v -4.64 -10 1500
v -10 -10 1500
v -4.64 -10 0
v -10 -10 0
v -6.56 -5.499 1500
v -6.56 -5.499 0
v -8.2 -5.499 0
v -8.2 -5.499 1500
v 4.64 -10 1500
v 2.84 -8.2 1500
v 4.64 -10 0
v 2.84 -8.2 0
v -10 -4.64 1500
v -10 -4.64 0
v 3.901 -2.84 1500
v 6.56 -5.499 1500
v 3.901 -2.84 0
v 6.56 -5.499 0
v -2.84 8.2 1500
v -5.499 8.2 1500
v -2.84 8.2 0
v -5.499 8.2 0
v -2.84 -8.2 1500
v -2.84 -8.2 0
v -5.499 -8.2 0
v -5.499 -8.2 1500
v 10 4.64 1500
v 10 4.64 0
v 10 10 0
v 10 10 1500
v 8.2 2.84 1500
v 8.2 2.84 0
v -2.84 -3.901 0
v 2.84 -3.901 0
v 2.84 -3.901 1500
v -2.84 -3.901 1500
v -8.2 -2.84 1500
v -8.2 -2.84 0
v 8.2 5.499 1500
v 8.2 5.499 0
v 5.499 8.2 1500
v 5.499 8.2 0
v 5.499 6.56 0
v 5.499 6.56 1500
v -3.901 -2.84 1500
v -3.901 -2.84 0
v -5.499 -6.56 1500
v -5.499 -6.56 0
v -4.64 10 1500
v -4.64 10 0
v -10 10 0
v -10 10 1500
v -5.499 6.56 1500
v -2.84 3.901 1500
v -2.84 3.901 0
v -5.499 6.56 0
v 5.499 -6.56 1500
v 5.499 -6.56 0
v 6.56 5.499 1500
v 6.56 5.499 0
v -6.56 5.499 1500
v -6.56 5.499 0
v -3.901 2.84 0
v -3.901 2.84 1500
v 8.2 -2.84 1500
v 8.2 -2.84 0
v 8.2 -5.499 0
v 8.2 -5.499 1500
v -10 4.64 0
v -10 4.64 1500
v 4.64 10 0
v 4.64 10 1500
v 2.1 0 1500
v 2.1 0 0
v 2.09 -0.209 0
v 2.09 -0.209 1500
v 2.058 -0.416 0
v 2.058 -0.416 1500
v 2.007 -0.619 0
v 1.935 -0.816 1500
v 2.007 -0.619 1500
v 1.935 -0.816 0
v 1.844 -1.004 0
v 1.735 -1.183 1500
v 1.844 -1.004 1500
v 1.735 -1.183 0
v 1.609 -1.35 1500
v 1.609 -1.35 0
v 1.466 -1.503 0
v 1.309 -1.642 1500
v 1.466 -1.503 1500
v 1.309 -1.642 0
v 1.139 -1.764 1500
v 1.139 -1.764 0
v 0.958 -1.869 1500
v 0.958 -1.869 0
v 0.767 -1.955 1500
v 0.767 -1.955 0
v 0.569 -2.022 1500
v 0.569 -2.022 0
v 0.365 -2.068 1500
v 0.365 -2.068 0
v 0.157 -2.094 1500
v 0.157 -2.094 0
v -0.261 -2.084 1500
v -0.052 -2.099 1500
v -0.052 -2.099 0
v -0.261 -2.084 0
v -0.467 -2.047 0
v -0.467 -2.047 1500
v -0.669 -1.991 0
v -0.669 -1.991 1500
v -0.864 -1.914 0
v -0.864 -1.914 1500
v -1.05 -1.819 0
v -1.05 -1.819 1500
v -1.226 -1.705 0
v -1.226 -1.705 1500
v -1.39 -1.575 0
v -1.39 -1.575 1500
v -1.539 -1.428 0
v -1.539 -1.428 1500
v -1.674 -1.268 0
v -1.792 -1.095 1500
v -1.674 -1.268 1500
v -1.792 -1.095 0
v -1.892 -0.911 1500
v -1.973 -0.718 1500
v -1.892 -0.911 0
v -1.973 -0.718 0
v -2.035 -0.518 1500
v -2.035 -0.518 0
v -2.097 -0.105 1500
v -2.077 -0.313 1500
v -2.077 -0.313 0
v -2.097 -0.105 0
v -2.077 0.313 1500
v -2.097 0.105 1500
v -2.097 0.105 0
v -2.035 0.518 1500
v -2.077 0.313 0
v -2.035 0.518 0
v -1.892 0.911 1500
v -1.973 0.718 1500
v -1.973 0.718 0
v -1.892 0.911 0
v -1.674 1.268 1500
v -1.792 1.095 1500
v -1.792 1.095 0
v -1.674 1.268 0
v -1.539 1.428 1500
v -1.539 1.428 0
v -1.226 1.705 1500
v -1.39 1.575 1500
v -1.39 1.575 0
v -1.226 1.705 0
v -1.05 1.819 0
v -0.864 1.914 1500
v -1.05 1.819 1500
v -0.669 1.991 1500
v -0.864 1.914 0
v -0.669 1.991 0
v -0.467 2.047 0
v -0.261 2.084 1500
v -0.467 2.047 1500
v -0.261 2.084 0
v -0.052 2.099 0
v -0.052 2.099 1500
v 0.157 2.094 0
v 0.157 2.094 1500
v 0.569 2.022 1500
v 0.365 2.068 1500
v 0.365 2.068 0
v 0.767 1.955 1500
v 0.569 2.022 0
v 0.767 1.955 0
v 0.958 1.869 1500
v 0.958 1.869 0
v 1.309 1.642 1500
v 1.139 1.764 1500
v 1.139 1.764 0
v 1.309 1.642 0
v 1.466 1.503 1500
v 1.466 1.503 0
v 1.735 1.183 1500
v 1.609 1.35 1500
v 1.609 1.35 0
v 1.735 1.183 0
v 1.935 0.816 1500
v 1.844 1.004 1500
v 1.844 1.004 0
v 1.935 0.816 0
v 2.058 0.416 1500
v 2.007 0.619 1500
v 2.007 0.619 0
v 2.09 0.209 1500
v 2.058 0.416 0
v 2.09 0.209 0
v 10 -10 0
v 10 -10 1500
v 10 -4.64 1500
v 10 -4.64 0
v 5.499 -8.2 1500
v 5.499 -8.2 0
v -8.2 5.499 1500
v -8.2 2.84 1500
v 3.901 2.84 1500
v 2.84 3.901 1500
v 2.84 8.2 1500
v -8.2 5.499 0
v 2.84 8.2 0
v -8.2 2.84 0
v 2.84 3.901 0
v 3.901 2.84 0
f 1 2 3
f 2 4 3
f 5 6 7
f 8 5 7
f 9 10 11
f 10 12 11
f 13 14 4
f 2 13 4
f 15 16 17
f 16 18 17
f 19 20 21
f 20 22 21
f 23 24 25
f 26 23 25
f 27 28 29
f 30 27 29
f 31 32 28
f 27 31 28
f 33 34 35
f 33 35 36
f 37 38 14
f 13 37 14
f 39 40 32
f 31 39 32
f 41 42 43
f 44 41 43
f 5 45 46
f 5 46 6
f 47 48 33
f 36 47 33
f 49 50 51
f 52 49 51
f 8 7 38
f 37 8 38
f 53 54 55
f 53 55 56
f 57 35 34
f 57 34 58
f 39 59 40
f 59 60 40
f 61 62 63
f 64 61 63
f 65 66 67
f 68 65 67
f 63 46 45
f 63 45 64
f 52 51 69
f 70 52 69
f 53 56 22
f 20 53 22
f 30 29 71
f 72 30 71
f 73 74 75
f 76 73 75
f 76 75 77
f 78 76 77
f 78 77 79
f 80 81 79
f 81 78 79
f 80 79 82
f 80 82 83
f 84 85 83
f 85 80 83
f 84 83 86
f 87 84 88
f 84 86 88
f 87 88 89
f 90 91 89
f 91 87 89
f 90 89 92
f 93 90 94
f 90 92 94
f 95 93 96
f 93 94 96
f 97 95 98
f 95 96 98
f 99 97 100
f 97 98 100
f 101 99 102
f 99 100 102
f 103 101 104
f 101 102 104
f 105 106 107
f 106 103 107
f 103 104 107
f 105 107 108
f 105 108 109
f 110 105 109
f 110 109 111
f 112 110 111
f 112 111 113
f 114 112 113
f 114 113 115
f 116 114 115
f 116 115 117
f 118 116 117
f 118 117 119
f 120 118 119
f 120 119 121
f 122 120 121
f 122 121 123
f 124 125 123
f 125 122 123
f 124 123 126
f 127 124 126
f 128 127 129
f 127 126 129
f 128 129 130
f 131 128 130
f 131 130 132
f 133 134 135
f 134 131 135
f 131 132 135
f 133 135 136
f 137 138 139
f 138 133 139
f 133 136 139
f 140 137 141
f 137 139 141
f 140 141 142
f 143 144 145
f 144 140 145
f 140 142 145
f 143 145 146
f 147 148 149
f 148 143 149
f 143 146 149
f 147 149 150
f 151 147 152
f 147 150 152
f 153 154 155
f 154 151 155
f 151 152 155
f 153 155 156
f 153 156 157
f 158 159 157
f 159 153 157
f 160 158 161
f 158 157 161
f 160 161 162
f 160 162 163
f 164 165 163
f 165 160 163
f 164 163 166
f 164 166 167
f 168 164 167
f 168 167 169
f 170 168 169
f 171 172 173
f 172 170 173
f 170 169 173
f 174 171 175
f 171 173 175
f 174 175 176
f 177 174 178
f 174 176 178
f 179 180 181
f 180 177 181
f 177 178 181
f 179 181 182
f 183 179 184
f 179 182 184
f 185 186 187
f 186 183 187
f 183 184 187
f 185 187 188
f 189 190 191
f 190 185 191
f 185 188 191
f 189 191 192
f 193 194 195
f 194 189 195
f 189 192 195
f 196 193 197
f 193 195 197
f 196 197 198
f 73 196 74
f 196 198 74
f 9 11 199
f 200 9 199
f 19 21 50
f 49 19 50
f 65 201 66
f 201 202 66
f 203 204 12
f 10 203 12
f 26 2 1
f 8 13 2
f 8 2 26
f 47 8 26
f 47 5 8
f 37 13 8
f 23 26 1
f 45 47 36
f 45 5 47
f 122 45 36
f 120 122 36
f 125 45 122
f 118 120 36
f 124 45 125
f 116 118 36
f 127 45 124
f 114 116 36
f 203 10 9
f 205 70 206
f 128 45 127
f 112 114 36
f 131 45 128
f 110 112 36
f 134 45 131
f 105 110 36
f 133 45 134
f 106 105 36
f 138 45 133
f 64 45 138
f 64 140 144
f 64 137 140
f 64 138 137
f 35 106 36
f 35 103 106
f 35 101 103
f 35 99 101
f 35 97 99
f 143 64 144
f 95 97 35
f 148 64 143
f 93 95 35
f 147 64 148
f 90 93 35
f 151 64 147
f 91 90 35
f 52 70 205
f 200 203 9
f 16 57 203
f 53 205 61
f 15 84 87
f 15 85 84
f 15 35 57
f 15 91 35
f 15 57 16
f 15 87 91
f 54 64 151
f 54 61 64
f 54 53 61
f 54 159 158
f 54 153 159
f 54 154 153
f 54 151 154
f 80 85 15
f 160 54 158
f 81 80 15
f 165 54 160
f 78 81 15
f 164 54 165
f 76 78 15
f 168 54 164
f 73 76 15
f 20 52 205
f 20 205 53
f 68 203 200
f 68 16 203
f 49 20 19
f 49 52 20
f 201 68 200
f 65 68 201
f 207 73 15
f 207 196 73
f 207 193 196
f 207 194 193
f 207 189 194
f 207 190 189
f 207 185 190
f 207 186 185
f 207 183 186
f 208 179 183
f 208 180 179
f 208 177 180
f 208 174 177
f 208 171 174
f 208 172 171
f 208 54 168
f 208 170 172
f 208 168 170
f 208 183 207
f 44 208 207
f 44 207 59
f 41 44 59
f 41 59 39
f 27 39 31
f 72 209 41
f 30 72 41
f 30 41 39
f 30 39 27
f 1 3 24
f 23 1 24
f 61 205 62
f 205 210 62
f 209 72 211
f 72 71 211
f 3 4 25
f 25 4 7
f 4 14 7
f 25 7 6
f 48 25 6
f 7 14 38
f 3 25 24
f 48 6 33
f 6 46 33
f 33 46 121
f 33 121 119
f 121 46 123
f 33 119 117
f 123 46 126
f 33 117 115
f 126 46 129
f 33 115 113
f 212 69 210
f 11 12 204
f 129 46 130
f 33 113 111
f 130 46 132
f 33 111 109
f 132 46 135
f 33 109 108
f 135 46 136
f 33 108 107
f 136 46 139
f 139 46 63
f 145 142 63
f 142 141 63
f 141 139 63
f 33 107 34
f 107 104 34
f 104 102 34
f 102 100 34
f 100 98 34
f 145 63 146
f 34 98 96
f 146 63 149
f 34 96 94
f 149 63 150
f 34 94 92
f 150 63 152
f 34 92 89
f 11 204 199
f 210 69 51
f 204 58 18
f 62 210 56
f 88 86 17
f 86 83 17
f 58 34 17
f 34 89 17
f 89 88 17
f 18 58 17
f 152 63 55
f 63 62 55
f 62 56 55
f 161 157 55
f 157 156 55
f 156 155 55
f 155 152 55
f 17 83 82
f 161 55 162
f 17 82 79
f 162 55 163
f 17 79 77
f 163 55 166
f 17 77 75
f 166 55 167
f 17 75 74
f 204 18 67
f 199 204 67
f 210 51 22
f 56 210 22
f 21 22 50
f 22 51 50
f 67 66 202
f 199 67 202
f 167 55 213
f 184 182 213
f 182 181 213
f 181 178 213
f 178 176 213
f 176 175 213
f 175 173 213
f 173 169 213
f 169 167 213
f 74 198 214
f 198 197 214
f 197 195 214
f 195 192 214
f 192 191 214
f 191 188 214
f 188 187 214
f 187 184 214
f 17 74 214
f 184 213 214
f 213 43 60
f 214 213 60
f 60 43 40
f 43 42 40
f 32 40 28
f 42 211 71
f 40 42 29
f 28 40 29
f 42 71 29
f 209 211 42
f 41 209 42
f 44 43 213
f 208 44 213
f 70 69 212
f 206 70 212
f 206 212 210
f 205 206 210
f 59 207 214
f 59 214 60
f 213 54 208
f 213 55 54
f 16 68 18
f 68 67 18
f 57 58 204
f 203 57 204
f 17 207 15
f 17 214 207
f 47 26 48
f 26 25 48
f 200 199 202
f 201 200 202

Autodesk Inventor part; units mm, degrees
ref_plane "YZ Plane" through (0, 0, 0) normal (1, 0, 0) x (0, 1, 0)
ref_plane "XZ Plane" through (0, 0, 0) normal (0, 1, 0) x (-1, 0, 0)
ref_plane "XY Plane" through (0, 0, 0) normal (0, 0, 1) x (1, 0, 0)
sketch "Sketch1" plane through (0, 0, 0) normal (0, 0, 1) x (1, 0, 0)
  line L0 (-3.9007, 3.9007) -> (3.9007, 3.9007)
  line L1 (3.9007, 3.9007) -> (3.9007, -3.9007)
  line L2 (3.9007, -3.9007) -> (-3.9007, -3.9007)
  line L3 (-3.9007, -3.9007) -> (-3.9007, 3.9007)
  line L4 (0, 3.9007) -> (0, -3.9007) construction
  line L5 (-3.9007, 0) -> (3.9007, 0) construction
  circle A0 centre (0, 0) radius 2.1
  line L6 (0, 0) -> (-16.1173, 16.1173) construction
  line L7 (0, 0) -> (22.7933, 0) construction
  line L8 (-2.84, 3.9007) -> (-5.4993, 6.56)
  line L9 (-5.4993, 6.56) -> (-5.4993, 8.2)
  line L10 (-5.4993, 8.2) -> (-2.84, 8.2)
  line L11 (-2.84, 8.2) -> (-4.64, 10)
  line L12 (-4.64, 10) -> (-10, 10)
  line L13 (-10, 10) -> (-10, 4.64)
  line L14 (-10, 4.64) -> (-8.2, 2.84)
  line L15 (-8.2, 2.84) -> (-8.2, 5.4993)
  line L16 (-8.2, 5.4993) -> (-6.56, 5.4993)
  line L17 (-6.56, 5.4993) -> (-3.9007, 2.84)
  line L18 (-3.9007, 2.84) -> (-11.3102, 2.84) construction
  line L19 (-2.84, 3.9007) -> (-3.9007, 3.9007)
  line L20 (-3.9007, 2.84) -> (-3.9007, 3.9007)
  line L21 (-3.9007, -2.84) -> (-6.56, -5.4993)
  line L22 (-6.56, -5.4993) -> (-8.2, -5.4993)
  line L23 (-8.2, -5.4993) -> (-8.2, -2.84)
  line L24 (-8.2, -2.84) -> (-10, -4.64)
  line L25 (-10, -4.64) -> (-10, -10)
  line L26 (-10, -10) -> (-4.64, -10)
  line L27 (-4.64, -10) -> (-2.84, -8.2)
  line L28 (-2.84, -8.2) -> (-5.4993, -8.2)
  line L29 (-5.4993, -8.2) -> (-5.4993, -6.56)
  line L30 (-5.4993, -6.56) -> (-2.84, -3.9007)
  line L31 (-3.9007, -2.84) -> (-3.9007, -3.9007)
  line L32 (-2.84, -3.9007) -> (-3.9007, -3.9007)
  line L33 (2.84, -3.9007) -> (5.4993, -6.56)
  line L34 (5.4993, -6.56) -> (5.4993, -8.2)
  line L35 (5.4993, -8.2) -> (2.84, -8.2)
  line L36 (2.84, -8.2) -> (4.64, -10)
  line L37 (4.64, -10) -> (10, -10)
  line L38 (10, -10) -> (10, -4.64)
  line L39 (10, -4.64) -> (8.2, -2.84)
  line L40 (8.2, -2.84) -> (8.2, -5.4993)
  line L41 (8.2, -5.4993) -> (6.56, -5.4993)
  line L42 (6.56, -5.4993) -> (3.9007, -2.84)
  line L43 (2.84, -3.9007) -> (3.9007, -3.9007)
  line L44 (3.9007, -2.84) -> (3.9007, -3.9007)
  line L45 (3.9007, 2.84) -> (6.56, 5.4993)
  line L46 (6.56, 5.4993) -> (8.2, 5.4993)
  line L47 (8.2, 5.4993) -> (8.2, 2.84)
  line L48 (8.2, 2.84) -> (10, 4.64)
  line L49 (10, 4.64) -> (10, 10)
  line L50 (10, 10) -> (4.64, 10)
  line L51 (4.64, 10) -> (2.84, 8.2)
  line L52 (2.84, 8.2) -> (5.4993, 8.2)
  line L53 (5.4993, 8.2) -> (5.4993, 6.56)
  line L54 (5.4993, 6.56) -> (2.84, 3.9007)
  line L55 (3.9007, 2.84) -> (3.9007, 3.9007)
  line L56 (2.84, 3.9007) -> (3.9007, 3.9007)
  dimension "d7" = 4.2
  dimension "d8" = 135
  dimension "d9" = 1.5
  dimension "d10" = 1.64
  dimension "d11" = 1.8
  dimension "d12" = 2.84
  dimension "d13" = 10
  dimension "d16" = 360
extrude "Extrusion1" add sketch "Sketch1" along normal blind 1500
properties part number "20x20x1500mm"
